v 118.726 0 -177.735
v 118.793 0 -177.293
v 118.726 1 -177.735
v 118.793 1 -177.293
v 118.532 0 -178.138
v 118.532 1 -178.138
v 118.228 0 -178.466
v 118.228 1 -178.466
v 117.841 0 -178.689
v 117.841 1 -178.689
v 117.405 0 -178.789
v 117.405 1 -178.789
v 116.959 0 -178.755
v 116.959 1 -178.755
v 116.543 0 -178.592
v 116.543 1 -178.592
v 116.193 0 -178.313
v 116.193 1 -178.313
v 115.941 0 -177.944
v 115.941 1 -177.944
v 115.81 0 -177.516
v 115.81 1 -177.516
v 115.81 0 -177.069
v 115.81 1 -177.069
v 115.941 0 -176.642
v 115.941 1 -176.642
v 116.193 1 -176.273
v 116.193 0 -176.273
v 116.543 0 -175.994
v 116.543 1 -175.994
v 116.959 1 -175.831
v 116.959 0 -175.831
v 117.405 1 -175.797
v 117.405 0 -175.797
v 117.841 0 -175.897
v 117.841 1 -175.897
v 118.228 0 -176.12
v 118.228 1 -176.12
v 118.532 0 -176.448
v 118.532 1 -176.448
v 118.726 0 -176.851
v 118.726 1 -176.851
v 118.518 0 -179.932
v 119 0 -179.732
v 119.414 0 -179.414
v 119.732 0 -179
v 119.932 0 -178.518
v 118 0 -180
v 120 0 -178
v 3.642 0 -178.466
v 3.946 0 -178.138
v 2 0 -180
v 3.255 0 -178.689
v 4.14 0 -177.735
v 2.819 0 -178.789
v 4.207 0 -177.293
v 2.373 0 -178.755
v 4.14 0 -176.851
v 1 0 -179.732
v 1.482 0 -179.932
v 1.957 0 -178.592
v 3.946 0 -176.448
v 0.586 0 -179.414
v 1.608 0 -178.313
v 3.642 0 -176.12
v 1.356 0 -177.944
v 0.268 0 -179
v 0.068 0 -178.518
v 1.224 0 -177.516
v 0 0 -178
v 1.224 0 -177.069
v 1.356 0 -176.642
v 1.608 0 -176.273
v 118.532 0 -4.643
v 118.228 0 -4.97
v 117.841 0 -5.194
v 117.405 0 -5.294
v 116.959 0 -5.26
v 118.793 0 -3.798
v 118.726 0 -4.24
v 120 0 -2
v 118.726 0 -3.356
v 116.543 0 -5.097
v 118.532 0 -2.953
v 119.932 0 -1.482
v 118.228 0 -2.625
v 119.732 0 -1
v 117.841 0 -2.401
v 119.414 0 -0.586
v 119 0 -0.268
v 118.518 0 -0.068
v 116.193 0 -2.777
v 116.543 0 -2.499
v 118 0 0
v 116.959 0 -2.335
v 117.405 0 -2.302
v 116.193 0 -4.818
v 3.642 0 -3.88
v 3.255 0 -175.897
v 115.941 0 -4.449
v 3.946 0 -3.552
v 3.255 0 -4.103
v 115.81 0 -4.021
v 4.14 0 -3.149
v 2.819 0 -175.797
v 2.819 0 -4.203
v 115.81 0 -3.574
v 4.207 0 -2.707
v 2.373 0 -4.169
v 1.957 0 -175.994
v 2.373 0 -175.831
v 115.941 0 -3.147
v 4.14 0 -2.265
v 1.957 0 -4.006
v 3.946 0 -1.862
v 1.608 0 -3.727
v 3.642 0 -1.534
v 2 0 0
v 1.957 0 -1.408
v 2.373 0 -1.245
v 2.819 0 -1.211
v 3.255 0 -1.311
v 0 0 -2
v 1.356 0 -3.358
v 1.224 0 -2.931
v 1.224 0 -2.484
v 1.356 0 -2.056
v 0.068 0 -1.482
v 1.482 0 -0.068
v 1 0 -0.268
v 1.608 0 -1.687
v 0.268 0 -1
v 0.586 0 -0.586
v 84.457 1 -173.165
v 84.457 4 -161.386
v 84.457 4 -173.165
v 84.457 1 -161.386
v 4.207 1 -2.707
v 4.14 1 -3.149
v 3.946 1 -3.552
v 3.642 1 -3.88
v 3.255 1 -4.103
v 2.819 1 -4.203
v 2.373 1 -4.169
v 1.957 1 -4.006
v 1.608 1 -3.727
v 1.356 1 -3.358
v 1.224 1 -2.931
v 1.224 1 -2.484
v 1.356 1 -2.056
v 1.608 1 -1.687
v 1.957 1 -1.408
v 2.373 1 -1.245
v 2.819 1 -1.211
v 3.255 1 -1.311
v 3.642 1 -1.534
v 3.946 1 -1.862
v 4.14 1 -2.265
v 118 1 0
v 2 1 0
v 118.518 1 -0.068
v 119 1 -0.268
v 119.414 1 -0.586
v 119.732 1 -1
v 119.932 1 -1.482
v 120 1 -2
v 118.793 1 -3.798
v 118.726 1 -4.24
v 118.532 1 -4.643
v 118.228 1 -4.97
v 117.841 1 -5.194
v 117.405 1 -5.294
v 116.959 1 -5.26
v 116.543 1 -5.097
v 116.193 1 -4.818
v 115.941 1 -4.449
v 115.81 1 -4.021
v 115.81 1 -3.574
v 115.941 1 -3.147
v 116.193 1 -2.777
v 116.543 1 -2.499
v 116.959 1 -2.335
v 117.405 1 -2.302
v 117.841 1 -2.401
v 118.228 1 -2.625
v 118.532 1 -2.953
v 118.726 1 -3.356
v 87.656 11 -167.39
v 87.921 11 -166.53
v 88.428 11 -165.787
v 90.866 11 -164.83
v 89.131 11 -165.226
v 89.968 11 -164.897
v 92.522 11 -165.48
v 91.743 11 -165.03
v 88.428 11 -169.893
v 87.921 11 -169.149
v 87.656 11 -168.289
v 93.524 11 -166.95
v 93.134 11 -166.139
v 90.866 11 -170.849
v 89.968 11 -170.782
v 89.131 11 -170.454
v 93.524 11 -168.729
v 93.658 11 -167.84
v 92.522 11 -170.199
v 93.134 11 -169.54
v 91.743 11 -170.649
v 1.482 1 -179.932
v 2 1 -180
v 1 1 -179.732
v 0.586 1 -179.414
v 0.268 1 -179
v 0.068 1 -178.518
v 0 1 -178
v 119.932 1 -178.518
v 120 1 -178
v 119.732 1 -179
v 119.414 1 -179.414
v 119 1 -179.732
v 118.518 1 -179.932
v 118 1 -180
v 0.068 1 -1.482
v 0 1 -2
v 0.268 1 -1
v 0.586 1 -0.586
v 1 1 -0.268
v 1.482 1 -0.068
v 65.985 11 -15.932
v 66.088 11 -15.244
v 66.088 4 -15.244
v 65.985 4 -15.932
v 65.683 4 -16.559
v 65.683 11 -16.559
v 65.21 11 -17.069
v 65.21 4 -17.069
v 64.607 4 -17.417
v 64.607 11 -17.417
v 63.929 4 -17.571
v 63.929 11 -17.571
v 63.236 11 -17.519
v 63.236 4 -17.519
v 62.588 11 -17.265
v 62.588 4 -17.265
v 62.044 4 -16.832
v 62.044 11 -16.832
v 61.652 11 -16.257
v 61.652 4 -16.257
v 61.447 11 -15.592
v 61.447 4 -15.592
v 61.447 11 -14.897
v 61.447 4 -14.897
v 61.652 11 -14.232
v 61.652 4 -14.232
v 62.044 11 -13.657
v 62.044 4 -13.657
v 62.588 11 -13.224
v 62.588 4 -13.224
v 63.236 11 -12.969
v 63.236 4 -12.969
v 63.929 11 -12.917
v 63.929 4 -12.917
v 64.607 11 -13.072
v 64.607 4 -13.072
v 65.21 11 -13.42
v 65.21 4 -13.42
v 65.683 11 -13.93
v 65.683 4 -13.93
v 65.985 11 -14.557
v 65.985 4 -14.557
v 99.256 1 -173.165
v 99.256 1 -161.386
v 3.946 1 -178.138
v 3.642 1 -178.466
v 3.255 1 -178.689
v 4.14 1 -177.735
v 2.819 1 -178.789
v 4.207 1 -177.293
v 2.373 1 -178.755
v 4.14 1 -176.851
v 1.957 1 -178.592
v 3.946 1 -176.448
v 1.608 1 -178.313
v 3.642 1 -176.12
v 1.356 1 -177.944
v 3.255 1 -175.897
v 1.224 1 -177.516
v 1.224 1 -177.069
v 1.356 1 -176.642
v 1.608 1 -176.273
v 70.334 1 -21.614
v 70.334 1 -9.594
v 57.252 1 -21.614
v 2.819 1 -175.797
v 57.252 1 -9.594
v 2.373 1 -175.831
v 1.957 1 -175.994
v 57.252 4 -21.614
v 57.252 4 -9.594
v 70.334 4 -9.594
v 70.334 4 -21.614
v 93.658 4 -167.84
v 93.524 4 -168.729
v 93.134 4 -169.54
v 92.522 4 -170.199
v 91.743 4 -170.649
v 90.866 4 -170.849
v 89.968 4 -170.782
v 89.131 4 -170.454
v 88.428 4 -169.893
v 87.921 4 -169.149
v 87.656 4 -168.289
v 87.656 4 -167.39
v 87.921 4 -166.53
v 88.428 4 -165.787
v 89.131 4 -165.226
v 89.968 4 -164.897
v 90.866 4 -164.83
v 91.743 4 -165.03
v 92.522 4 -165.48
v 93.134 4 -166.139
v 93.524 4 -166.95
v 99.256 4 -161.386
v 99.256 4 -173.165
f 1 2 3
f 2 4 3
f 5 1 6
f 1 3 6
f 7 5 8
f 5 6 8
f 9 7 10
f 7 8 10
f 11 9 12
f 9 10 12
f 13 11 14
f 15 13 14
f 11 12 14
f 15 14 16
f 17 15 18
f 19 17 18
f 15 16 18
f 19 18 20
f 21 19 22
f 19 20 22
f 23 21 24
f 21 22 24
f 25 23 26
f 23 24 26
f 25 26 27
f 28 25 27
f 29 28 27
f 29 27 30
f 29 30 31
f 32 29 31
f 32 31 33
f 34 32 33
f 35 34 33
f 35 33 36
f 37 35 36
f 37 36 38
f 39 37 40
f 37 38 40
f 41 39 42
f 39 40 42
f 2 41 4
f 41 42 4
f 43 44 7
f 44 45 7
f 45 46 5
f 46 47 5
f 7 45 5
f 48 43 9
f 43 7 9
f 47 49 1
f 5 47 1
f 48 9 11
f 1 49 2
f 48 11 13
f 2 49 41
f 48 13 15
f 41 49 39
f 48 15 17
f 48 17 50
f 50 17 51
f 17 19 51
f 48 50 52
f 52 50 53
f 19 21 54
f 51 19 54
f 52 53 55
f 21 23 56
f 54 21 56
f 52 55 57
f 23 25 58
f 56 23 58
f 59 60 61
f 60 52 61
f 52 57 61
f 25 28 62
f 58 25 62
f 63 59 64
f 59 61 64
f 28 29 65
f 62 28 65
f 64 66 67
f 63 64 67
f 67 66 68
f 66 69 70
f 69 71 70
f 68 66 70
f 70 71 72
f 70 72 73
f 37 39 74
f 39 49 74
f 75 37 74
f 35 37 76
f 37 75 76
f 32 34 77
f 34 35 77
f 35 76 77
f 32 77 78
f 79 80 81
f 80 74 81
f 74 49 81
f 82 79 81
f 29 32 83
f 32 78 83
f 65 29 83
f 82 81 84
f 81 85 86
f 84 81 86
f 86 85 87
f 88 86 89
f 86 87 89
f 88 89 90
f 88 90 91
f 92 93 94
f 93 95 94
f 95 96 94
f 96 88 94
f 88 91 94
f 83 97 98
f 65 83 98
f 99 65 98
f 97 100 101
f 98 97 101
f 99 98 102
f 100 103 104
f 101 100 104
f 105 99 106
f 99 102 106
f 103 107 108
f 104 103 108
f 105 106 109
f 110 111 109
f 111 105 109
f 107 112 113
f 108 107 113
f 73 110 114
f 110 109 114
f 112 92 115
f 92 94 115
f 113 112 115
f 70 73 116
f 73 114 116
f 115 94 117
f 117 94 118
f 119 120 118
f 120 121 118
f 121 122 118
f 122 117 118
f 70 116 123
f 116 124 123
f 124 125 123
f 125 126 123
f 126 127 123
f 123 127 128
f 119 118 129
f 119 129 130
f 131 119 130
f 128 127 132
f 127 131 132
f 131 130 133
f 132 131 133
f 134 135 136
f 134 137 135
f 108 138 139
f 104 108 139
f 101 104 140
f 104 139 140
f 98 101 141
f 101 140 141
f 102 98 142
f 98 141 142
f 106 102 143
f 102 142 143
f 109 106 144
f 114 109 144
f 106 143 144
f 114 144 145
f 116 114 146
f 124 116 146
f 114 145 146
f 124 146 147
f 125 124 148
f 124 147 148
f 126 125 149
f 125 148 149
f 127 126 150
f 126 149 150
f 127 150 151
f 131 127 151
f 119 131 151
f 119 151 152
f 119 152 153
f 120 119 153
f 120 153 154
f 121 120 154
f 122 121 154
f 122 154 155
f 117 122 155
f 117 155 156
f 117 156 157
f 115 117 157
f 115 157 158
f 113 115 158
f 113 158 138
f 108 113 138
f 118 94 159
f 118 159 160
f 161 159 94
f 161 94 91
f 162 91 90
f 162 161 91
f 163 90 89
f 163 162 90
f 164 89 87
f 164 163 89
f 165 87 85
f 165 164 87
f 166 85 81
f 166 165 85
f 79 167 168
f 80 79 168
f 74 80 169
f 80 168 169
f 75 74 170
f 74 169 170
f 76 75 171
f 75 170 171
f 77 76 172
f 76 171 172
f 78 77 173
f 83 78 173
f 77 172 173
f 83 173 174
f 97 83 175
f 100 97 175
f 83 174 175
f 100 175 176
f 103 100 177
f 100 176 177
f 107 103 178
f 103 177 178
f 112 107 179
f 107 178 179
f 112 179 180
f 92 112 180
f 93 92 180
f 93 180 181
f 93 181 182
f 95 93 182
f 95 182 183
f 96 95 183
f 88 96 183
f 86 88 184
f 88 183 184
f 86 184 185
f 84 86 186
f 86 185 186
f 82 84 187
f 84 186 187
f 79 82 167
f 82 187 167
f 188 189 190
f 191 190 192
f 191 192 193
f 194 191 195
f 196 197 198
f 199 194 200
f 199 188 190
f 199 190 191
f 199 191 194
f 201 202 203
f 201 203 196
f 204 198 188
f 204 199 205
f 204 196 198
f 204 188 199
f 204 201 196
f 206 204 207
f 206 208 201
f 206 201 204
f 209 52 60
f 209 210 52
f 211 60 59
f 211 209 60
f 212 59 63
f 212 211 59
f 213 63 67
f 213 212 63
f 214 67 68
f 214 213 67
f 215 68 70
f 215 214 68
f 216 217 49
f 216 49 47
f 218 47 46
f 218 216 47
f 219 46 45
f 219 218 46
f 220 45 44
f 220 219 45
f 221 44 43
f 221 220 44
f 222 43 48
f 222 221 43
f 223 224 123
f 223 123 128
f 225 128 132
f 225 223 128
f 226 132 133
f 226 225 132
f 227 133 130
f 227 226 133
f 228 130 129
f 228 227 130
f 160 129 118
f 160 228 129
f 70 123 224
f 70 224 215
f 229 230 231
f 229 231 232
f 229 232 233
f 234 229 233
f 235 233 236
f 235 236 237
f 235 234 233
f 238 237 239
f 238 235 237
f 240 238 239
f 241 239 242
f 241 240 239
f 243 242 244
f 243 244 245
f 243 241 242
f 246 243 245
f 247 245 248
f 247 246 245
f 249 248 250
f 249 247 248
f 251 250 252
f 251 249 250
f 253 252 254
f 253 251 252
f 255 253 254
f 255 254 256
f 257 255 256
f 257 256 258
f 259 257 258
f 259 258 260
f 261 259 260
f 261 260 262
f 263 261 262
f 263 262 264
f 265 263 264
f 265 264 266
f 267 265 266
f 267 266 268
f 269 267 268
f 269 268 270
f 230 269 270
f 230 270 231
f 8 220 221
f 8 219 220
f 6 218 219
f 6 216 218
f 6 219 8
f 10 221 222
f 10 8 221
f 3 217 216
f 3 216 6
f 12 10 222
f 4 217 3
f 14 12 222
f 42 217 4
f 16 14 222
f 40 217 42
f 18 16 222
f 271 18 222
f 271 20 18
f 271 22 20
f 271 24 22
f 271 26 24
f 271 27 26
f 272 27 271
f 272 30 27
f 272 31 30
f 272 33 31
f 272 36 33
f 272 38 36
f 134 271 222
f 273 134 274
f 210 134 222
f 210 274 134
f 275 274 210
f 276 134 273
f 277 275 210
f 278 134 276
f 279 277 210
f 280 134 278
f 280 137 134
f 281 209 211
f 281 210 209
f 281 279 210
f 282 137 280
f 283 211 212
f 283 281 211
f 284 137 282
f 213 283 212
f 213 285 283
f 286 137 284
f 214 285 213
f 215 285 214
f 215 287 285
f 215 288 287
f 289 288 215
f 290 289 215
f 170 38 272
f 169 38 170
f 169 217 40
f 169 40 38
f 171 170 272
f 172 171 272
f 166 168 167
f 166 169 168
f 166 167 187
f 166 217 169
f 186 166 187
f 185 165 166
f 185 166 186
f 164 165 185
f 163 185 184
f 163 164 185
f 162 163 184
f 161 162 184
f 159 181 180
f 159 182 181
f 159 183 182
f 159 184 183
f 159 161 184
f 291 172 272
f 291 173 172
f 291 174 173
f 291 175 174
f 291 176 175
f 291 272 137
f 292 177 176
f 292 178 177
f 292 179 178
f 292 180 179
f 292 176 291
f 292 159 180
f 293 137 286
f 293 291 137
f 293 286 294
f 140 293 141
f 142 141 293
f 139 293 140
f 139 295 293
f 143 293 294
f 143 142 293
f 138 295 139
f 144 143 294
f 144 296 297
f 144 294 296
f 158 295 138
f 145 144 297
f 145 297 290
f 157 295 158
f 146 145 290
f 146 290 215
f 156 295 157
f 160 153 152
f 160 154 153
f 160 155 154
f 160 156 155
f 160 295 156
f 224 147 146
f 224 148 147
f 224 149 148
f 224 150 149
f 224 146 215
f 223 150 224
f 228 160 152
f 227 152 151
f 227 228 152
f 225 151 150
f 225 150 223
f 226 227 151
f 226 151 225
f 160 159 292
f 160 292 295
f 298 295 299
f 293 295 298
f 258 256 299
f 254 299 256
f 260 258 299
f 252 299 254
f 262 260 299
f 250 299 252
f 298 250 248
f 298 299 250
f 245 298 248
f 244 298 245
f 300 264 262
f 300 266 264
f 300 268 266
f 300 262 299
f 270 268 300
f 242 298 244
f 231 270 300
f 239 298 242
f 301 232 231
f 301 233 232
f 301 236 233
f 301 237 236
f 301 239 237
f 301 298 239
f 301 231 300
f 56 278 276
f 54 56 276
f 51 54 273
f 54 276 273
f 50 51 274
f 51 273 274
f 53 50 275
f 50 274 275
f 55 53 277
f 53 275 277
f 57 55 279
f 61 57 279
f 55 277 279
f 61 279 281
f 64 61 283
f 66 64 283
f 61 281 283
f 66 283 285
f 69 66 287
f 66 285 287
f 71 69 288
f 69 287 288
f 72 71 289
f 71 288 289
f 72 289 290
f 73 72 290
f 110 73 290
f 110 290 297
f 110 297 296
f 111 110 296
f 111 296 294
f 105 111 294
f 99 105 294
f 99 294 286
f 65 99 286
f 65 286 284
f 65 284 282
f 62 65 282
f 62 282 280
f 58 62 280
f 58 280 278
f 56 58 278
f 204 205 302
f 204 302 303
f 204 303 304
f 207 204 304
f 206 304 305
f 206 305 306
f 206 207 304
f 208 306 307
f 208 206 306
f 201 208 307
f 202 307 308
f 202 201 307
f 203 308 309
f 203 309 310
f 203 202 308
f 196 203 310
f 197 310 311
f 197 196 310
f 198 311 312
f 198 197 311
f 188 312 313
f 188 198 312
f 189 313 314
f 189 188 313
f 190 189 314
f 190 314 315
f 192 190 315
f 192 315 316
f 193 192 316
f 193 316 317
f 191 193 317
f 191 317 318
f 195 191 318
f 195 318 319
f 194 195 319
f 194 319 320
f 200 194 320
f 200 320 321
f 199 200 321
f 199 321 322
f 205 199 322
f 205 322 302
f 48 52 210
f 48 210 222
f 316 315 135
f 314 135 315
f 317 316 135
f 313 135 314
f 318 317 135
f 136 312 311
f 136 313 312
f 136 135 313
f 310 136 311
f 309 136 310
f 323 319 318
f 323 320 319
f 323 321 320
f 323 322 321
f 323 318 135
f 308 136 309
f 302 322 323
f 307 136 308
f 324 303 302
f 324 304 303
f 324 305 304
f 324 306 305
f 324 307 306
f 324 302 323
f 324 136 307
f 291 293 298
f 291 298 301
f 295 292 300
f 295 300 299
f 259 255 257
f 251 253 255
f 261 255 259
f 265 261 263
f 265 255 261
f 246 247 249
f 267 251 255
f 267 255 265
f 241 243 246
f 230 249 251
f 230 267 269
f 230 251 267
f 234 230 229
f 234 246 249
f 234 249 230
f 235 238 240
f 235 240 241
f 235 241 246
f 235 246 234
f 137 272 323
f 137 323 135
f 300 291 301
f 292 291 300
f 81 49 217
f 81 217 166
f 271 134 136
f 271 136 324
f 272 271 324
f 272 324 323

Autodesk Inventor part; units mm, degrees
ref_plane "YZ Plane" through (0, 0, 0) normal (1, 0, 0) x (0, 1, 0)
ref_plane "XZ Plane" through (0, 0, 0) normal (0, 1, 0) x (-1, 0, 0)
ref_plane "XY Plane" through (0, 0, 0) normal (0, 0, 1) x (1, 0, 0)
sketch "Sketch1" plane through (0, 0, 0) normal (0, 1, 0) x (-1, 0, 0)
  line L0 (0, 0) -> (0, -180)
  line L1 (0, -180) -> (-120, -180)
  line L2 (-120, -180) -> (-120, 0)
  line L3 (-120, 0) -> (0, 0)
  dimension "d1" = 180
  dimension "d2" = 120
extrude "Extrusion1" add sketch "Sketch1" along normal blind 1
fillet "Fillet1" radius 2 4 edges at (0, 0.5, 0) (120, 0.5, 0) (120, 0.5, -180) (0, 0.5, -180)
sketch "Sketch2" plane through (0, 1, 0) normal (0, 1, 0) x (1, 0, 0)
  arc A0 (2, 180) -> (0, 178) centre (2, 178) ccw projected
  circle A1 centre (2.7071, 177.2929) radius 1.5
  line L0 (2, 0) -> (118, 0) projected
  line L1 (118, 180) -> (2, 180) projected
  arc A2 (120, 178) -> (118, 180) centre (118, 178) ccw projected
  circle A3 centre (117.2929, 177.2929) radius 1.5
  arc A4 (118, 0) -> (120, 2) centre (118, 2) ccw projected
  circle A5 centre (117.2929, 3.7977) radius 1.5
  arc A6 (0, 2) -> (2, 0) centre (2, 2) ccw projected
  circle A7 centre (2.7071, 2.7071) radius 1.5
  point P0 (0, 0)
  dimension "d7" = 3
  dimension "d10" = 3
  dimension "d11" = 3
extrude "Extrusion2" cut sketch "Sketch2" against normal through all
sketch "Sketch3" plane through (0, 1, 0) normal (0, 1, 0) x (1, 0, 0)
  line L0 (57.2525, 21.6143) -> (70.3337, 21.6143)
  line L1 (70.3337, 21.6143) -> (70.3337, 9.5938)
  line L2 (70.3337, 9.5938) -> (57.2525, 9.5938)
  line L3 (57.2525, 9.5938) -> (57.2525, 21.6143)
  line L4 (84.4572, 173.1647) -> (99.2564, 173.1647)
  line L5 (99.2564, 173.1647) -> (99.2564, 161.3857)
  line L6 (99.2564, 161.3857) -> (84.4572, 161.3857)
  line L7 (84.4572, 161.3857) -> (84.4572, 173.1647)
  point P0 (0, 0)
extrude "Extrusion3" add sketch "Sketch3" along normal blind 10
sketch "Sketch4" plane through (0, 11, 0) normal (0, 1, 0) x (1, 0, 0)
  circle A0 centre (63.7549, 15.2444) radius 2.3335
  circle A1 centre (90.6401, 167.8396) radius 3.0183
  line L0 (57.2525, 9.5938) -> (70.3337, 9.5938) projected
  line L1 (70.3337, 21.6143) -> (70.3337, 9.5938)
  line L2 (70.3337, 9.5938) -> (57.2525, 9.5938)
  line L3 (57.2525, 9.5938) -> (57.2525, 21.6143)
  line L4 (57.2525, 21.6143) -> (70.3337, 21.6143)
  line L5 (99.2564, 161.3857) -> (99.2564, 173.1647) projected
  line L6 (84.4572, 173.1647) -> (99.2564, 173.1647)
  line L7 (99.2564, 173.1647) -> (99.2564, 161.3857)
  line L8 (99.2564, 161.3857) -> (84.4572, 161.3857)
  line L9 (84.4572, 173.1647) -> (84.4572, 161.3857) projected
  line L10 (84.4572, 161.3857) -> (84.4572, 173.1647)
  point P0 (0, 0)
extrude "Extrusion4" cut sketch "Sketch4" against normal blind 7
equation "\"BendRadius\" = Thickness"
equation "\"BendReliefWidth\" = Thickness"
equation "\"BendReliefDepth\" = 0.5 * Thickness"
equation "\"CornerReliefSize\" = 4 * Thickness"
equation "\"MinimumRemnant\" = 2 * Thickness"
equation "\"TransitionRadius\" = BendRadius"
equation "\"JacobiRadiusSize\" = BendRadius"
equation "\"GapSize\" = Thickness"
equation "\"Thickness\" = 3.048"
properties part number "PCB" material "Aluminum 6061"
